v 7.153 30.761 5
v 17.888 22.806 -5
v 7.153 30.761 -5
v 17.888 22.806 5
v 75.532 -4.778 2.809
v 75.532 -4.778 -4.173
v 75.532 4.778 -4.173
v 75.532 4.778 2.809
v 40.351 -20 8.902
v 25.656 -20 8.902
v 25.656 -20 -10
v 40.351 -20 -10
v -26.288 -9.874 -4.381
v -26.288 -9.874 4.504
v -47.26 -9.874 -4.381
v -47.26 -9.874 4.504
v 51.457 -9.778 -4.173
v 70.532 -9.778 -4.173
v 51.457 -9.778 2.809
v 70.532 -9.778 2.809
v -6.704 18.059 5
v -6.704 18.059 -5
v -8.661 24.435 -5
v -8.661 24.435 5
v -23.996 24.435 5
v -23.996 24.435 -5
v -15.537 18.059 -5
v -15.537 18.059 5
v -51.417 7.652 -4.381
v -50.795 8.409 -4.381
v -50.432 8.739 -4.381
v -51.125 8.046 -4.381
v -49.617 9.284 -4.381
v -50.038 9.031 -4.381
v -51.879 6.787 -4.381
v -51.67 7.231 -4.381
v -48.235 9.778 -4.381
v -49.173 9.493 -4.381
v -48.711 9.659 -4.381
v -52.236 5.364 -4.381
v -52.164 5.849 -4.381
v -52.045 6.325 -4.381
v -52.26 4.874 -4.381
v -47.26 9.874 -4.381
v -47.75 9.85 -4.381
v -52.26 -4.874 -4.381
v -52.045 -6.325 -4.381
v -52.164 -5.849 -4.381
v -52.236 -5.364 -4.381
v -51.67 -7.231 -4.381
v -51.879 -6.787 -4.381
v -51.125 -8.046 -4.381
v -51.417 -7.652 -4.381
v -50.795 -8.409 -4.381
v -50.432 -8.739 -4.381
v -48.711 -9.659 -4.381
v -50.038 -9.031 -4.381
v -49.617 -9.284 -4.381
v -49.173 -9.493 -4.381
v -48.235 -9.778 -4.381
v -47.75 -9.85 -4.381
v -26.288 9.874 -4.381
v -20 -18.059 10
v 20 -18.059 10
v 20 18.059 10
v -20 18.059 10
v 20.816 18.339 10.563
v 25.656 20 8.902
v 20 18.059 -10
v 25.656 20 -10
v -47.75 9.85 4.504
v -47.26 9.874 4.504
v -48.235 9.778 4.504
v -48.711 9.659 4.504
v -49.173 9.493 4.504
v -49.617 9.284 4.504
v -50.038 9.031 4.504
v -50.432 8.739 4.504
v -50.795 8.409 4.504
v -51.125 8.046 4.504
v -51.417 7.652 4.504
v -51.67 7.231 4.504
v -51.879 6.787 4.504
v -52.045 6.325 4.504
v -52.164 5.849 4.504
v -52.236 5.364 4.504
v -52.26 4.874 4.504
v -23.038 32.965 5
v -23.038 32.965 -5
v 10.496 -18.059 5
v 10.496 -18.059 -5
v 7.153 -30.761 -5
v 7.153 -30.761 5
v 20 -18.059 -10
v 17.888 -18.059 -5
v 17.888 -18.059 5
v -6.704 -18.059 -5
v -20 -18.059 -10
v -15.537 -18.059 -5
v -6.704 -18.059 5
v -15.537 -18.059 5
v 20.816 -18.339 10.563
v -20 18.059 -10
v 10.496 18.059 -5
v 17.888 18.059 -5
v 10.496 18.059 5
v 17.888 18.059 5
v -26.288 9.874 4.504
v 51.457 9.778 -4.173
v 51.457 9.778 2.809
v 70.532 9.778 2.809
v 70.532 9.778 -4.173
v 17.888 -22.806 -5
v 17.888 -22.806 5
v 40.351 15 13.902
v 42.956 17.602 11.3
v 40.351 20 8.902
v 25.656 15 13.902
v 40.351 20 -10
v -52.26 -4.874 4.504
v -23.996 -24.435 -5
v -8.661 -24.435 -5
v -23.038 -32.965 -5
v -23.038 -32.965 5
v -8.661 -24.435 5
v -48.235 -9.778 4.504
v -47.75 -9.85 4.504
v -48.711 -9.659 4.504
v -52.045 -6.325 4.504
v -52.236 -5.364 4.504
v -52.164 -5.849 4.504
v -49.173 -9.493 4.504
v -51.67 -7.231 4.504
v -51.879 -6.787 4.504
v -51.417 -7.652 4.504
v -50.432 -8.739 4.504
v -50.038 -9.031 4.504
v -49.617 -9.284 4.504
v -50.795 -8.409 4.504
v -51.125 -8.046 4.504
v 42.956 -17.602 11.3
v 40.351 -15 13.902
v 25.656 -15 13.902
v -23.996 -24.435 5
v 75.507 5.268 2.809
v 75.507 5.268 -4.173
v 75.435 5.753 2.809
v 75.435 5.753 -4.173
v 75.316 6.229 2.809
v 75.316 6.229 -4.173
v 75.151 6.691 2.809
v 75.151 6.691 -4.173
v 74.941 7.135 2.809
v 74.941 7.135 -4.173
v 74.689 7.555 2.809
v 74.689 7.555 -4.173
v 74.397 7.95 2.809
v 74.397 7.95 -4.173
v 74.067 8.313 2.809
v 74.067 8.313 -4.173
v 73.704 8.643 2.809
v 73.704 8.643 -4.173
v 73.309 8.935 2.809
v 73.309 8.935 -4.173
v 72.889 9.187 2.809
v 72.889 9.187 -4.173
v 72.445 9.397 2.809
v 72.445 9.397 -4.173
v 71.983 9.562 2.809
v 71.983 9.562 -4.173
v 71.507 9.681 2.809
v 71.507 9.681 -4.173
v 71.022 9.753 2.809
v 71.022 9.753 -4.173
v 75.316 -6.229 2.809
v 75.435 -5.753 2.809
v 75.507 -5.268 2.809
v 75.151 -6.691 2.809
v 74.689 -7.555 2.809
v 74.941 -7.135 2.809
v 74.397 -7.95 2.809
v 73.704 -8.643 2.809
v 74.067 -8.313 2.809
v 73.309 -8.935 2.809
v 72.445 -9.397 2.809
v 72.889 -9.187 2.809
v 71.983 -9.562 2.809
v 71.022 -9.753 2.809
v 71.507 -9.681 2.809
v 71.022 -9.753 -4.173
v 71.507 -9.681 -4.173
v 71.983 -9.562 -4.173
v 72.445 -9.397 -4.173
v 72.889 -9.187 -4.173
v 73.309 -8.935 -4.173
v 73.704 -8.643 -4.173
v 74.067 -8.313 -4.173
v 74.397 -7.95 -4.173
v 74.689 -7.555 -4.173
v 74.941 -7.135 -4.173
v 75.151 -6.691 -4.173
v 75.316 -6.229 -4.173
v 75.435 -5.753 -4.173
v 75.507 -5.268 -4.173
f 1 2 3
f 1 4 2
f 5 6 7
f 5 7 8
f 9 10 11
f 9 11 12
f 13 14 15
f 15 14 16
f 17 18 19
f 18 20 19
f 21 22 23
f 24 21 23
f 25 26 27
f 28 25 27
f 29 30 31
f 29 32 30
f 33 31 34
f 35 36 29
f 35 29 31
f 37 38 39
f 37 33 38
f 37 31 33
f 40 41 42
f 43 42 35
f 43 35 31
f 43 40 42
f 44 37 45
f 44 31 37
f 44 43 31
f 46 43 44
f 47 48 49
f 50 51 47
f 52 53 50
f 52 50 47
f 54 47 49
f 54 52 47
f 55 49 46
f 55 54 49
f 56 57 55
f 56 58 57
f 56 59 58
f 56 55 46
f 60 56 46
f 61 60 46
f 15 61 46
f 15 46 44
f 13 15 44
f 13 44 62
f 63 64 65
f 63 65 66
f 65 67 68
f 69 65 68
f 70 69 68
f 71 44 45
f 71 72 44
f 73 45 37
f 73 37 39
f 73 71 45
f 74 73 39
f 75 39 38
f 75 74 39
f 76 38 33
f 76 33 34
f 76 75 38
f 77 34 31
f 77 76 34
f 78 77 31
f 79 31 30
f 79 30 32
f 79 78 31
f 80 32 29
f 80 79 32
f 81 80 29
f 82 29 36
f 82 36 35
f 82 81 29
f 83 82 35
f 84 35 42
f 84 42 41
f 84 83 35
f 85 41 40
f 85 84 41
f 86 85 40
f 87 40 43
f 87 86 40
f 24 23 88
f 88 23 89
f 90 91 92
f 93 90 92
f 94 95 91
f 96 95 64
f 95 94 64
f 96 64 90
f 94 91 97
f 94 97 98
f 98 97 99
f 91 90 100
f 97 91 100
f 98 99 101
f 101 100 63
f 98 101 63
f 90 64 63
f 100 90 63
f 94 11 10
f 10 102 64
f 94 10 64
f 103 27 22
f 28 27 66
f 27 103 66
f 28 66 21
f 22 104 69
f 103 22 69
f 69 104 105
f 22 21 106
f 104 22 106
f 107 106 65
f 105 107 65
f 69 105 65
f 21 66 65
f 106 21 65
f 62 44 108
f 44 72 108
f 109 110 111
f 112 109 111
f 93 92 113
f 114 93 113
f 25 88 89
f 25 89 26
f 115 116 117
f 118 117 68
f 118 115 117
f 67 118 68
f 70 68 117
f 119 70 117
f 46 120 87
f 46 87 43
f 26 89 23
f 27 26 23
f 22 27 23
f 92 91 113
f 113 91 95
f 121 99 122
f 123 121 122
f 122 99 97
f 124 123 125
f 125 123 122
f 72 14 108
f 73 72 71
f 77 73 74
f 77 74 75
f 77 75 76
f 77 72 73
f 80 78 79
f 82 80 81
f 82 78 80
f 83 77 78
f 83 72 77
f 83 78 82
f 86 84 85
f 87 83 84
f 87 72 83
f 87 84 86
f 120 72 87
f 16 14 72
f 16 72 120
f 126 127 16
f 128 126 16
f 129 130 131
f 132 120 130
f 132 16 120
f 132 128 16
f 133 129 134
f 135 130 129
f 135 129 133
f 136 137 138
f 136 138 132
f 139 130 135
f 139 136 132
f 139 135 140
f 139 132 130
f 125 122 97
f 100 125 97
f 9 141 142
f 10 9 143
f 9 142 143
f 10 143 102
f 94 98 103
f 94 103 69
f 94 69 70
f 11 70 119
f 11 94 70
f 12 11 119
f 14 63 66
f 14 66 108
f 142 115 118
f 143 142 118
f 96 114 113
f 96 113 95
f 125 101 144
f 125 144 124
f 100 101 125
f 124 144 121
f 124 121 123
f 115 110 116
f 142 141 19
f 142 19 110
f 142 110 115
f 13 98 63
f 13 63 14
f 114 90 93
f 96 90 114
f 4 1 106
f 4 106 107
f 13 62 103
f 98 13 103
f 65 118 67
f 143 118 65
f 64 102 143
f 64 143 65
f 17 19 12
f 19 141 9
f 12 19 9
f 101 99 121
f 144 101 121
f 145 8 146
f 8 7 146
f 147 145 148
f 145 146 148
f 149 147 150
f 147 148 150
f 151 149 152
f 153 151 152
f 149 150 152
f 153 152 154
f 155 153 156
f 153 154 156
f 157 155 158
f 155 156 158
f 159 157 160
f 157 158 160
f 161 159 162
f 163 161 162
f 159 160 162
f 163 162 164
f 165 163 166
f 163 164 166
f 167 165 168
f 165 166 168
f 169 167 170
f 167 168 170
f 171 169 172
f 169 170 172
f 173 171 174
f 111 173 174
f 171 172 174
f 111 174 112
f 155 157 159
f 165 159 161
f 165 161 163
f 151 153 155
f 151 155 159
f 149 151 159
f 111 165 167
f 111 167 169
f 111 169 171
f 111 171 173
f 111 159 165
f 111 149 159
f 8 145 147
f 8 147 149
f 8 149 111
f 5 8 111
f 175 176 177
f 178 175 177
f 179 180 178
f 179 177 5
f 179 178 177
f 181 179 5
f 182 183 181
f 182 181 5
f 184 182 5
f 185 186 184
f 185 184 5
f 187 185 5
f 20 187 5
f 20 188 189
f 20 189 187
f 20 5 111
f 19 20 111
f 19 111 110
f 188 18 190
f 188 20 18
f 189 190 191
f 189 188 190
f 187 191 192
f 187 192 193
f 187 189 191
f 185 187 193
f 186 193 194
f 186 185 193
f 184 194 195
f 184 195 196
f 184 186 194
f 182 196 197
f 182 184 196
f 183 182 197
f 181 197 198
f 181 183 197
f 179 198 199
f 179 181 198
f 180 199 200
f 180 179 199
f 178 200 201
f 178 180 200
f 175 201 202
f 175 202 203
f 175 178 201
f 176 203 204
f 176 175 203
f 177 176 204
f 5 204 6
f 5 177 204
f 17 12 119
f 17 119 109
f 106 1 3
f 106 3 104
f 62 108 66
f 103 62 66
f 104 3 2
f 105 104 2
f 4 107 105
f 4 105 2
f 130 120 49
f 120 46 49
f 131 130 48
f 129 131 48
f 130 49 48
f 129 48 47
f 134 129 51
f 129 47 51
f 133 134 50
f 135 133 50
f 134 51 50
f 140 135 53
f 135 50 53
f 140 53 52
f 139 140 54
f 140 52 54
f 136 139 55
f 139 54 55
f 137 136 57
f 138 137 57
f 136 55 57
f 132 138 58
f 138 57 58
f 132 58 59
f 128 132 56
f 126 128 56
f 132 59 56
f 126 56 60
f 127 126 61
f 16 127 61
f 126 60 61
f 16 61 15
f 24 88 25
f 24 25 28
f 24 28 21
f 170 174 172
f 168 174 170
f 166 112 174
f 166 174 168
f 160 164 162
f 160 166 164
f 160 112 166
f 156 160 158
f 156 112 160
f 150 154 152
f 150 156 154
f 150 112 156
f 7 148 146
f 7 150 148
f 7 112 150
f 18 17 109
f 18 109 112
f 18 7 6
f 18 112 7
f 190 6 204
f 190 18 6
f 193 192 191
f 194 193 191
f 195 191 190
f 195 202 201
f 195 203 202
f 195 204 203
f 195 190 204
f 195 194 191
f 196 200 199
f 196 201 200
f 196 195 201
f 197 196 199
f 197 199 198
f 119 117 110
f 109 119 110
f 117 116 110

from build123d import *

# Parameters (mm, degrees)
F1_DEPTH = 20
F3_DEPTH = 43.4
F5_DEPTH = 5
F6_R     = 5
F8_SIZE  = 5


# Not quite as in the source:
# - a feature names something its author has since deleted; it is built from what else it names


with BuildPart() as f1:
    # F0 (on Front) → F1 (new body, symmetric)
    with BuildSketch(Plane.XZ):
        Polygon((20, 10), (-20, 10), (-26.2878760695, 4.5041712001), (-52.2599183023, 4.5041712001), (-52.2599183023, -4.38100053), (-26.2878760695, -4.38100053), (-20, -10), (20, -10), (40.3509177268, -10), (51.457375288, -4.1727770417), (75.5315572023, -4.1727770417), (75.5315572023, 2.809499735), (51.457375288, 2.809499735), (40.3509177268, 13.9019489288), (25.6562046707, 13.9019489288), align=None)
    extrude(amount=F1_DEPTH, both=True)

    # F2 (on face) → F3 (cut, symmetric)
    with BuildSketch(Plane.XY.offset(10)):
        Polygon((-20, 18.0594865233), (20, 18.0594865233), (25.6562046707, 20), (40.3509177268, 20), (51.457375288, 9.7775636241), (82.4265927076, 9.7775636241), (82.4265927076, -9.7775636241), (51.457375288, -9.7775636241), (40.3509177268, -20), (25.6562046707, -20), (20, -18.0594865233), (-20, -18.0594865233), (-26.2878760695, -9.8739182577), (-73.8637112081, -9.8739182577), (-73.8637112081, -40.0371998549), (108.4082424641, -42.2960631549), (105.6976020336, 36.3123118877), (-67.5570517778, 60.9338954091), (-73.8637112081, 9.8739182577), (-26.2878760695, 9.8739182577), align=None)
    extrude(amount=F3_DEPTH, both=True, mode=Mode.SUBTRACT)

    # F4 (on Top) → F5 (join, symmetric)
    with BuildSketch(Plane.XY):
        Polygon((17.8880691528, -22.8056833148), (17.8880691528, -14.7547144443), (11.4664630964, -14.3713355064), (7.1534435265, -30.7608079165), align=None)
        Polygon((-5.6897685863, -14.7547144443), (-11.1529268324, -14.7547144443), (-23.9961370826, -24.4350470603), (-23.0376925319, -32.9652391374), (-8.6609609425, -24.4350470603), align=None)
        Polygon((-8.6609609425, 24.4350470603), (-23.0376925319, 32.9652391374), (-23.9961370826, 24.4350470603), (-11.1529268324, 14.7547144443), (-5.6897685863, 14.7547144443), align=None)
        Polygon((7.1534435265, 30.7608079165), (11.4664630964, 14.3713355064), (17.8880691528, 14.7547144443), (17.8880691528, 22.8056833148), align=None)
    extrude(amount=F5_DEPTH, both=True)

    # F6
    f6_edges = [f1.edges().sort_by_distance(p)[0] for p in [
        (-52.259918, 9.873918, 0.061585),
        (75.531557, 9.777564, -0.681639),
        (75.531557, -9.777564, -0.681639),
        (-52.259918, -9.873918, 0.061585),
    ]]
    fillet(f6_edges, radius=F6_R)

    # F8
    f8_edges = [f1.edges().sort_by_distance(p)[0] for p in [
        (33.003561, -20, 13.901949),
        (33.003561, 20, 13.901949),
    ]]
    chamfer(f8_edges, length=F8_SIZE)


solid = f1.part
